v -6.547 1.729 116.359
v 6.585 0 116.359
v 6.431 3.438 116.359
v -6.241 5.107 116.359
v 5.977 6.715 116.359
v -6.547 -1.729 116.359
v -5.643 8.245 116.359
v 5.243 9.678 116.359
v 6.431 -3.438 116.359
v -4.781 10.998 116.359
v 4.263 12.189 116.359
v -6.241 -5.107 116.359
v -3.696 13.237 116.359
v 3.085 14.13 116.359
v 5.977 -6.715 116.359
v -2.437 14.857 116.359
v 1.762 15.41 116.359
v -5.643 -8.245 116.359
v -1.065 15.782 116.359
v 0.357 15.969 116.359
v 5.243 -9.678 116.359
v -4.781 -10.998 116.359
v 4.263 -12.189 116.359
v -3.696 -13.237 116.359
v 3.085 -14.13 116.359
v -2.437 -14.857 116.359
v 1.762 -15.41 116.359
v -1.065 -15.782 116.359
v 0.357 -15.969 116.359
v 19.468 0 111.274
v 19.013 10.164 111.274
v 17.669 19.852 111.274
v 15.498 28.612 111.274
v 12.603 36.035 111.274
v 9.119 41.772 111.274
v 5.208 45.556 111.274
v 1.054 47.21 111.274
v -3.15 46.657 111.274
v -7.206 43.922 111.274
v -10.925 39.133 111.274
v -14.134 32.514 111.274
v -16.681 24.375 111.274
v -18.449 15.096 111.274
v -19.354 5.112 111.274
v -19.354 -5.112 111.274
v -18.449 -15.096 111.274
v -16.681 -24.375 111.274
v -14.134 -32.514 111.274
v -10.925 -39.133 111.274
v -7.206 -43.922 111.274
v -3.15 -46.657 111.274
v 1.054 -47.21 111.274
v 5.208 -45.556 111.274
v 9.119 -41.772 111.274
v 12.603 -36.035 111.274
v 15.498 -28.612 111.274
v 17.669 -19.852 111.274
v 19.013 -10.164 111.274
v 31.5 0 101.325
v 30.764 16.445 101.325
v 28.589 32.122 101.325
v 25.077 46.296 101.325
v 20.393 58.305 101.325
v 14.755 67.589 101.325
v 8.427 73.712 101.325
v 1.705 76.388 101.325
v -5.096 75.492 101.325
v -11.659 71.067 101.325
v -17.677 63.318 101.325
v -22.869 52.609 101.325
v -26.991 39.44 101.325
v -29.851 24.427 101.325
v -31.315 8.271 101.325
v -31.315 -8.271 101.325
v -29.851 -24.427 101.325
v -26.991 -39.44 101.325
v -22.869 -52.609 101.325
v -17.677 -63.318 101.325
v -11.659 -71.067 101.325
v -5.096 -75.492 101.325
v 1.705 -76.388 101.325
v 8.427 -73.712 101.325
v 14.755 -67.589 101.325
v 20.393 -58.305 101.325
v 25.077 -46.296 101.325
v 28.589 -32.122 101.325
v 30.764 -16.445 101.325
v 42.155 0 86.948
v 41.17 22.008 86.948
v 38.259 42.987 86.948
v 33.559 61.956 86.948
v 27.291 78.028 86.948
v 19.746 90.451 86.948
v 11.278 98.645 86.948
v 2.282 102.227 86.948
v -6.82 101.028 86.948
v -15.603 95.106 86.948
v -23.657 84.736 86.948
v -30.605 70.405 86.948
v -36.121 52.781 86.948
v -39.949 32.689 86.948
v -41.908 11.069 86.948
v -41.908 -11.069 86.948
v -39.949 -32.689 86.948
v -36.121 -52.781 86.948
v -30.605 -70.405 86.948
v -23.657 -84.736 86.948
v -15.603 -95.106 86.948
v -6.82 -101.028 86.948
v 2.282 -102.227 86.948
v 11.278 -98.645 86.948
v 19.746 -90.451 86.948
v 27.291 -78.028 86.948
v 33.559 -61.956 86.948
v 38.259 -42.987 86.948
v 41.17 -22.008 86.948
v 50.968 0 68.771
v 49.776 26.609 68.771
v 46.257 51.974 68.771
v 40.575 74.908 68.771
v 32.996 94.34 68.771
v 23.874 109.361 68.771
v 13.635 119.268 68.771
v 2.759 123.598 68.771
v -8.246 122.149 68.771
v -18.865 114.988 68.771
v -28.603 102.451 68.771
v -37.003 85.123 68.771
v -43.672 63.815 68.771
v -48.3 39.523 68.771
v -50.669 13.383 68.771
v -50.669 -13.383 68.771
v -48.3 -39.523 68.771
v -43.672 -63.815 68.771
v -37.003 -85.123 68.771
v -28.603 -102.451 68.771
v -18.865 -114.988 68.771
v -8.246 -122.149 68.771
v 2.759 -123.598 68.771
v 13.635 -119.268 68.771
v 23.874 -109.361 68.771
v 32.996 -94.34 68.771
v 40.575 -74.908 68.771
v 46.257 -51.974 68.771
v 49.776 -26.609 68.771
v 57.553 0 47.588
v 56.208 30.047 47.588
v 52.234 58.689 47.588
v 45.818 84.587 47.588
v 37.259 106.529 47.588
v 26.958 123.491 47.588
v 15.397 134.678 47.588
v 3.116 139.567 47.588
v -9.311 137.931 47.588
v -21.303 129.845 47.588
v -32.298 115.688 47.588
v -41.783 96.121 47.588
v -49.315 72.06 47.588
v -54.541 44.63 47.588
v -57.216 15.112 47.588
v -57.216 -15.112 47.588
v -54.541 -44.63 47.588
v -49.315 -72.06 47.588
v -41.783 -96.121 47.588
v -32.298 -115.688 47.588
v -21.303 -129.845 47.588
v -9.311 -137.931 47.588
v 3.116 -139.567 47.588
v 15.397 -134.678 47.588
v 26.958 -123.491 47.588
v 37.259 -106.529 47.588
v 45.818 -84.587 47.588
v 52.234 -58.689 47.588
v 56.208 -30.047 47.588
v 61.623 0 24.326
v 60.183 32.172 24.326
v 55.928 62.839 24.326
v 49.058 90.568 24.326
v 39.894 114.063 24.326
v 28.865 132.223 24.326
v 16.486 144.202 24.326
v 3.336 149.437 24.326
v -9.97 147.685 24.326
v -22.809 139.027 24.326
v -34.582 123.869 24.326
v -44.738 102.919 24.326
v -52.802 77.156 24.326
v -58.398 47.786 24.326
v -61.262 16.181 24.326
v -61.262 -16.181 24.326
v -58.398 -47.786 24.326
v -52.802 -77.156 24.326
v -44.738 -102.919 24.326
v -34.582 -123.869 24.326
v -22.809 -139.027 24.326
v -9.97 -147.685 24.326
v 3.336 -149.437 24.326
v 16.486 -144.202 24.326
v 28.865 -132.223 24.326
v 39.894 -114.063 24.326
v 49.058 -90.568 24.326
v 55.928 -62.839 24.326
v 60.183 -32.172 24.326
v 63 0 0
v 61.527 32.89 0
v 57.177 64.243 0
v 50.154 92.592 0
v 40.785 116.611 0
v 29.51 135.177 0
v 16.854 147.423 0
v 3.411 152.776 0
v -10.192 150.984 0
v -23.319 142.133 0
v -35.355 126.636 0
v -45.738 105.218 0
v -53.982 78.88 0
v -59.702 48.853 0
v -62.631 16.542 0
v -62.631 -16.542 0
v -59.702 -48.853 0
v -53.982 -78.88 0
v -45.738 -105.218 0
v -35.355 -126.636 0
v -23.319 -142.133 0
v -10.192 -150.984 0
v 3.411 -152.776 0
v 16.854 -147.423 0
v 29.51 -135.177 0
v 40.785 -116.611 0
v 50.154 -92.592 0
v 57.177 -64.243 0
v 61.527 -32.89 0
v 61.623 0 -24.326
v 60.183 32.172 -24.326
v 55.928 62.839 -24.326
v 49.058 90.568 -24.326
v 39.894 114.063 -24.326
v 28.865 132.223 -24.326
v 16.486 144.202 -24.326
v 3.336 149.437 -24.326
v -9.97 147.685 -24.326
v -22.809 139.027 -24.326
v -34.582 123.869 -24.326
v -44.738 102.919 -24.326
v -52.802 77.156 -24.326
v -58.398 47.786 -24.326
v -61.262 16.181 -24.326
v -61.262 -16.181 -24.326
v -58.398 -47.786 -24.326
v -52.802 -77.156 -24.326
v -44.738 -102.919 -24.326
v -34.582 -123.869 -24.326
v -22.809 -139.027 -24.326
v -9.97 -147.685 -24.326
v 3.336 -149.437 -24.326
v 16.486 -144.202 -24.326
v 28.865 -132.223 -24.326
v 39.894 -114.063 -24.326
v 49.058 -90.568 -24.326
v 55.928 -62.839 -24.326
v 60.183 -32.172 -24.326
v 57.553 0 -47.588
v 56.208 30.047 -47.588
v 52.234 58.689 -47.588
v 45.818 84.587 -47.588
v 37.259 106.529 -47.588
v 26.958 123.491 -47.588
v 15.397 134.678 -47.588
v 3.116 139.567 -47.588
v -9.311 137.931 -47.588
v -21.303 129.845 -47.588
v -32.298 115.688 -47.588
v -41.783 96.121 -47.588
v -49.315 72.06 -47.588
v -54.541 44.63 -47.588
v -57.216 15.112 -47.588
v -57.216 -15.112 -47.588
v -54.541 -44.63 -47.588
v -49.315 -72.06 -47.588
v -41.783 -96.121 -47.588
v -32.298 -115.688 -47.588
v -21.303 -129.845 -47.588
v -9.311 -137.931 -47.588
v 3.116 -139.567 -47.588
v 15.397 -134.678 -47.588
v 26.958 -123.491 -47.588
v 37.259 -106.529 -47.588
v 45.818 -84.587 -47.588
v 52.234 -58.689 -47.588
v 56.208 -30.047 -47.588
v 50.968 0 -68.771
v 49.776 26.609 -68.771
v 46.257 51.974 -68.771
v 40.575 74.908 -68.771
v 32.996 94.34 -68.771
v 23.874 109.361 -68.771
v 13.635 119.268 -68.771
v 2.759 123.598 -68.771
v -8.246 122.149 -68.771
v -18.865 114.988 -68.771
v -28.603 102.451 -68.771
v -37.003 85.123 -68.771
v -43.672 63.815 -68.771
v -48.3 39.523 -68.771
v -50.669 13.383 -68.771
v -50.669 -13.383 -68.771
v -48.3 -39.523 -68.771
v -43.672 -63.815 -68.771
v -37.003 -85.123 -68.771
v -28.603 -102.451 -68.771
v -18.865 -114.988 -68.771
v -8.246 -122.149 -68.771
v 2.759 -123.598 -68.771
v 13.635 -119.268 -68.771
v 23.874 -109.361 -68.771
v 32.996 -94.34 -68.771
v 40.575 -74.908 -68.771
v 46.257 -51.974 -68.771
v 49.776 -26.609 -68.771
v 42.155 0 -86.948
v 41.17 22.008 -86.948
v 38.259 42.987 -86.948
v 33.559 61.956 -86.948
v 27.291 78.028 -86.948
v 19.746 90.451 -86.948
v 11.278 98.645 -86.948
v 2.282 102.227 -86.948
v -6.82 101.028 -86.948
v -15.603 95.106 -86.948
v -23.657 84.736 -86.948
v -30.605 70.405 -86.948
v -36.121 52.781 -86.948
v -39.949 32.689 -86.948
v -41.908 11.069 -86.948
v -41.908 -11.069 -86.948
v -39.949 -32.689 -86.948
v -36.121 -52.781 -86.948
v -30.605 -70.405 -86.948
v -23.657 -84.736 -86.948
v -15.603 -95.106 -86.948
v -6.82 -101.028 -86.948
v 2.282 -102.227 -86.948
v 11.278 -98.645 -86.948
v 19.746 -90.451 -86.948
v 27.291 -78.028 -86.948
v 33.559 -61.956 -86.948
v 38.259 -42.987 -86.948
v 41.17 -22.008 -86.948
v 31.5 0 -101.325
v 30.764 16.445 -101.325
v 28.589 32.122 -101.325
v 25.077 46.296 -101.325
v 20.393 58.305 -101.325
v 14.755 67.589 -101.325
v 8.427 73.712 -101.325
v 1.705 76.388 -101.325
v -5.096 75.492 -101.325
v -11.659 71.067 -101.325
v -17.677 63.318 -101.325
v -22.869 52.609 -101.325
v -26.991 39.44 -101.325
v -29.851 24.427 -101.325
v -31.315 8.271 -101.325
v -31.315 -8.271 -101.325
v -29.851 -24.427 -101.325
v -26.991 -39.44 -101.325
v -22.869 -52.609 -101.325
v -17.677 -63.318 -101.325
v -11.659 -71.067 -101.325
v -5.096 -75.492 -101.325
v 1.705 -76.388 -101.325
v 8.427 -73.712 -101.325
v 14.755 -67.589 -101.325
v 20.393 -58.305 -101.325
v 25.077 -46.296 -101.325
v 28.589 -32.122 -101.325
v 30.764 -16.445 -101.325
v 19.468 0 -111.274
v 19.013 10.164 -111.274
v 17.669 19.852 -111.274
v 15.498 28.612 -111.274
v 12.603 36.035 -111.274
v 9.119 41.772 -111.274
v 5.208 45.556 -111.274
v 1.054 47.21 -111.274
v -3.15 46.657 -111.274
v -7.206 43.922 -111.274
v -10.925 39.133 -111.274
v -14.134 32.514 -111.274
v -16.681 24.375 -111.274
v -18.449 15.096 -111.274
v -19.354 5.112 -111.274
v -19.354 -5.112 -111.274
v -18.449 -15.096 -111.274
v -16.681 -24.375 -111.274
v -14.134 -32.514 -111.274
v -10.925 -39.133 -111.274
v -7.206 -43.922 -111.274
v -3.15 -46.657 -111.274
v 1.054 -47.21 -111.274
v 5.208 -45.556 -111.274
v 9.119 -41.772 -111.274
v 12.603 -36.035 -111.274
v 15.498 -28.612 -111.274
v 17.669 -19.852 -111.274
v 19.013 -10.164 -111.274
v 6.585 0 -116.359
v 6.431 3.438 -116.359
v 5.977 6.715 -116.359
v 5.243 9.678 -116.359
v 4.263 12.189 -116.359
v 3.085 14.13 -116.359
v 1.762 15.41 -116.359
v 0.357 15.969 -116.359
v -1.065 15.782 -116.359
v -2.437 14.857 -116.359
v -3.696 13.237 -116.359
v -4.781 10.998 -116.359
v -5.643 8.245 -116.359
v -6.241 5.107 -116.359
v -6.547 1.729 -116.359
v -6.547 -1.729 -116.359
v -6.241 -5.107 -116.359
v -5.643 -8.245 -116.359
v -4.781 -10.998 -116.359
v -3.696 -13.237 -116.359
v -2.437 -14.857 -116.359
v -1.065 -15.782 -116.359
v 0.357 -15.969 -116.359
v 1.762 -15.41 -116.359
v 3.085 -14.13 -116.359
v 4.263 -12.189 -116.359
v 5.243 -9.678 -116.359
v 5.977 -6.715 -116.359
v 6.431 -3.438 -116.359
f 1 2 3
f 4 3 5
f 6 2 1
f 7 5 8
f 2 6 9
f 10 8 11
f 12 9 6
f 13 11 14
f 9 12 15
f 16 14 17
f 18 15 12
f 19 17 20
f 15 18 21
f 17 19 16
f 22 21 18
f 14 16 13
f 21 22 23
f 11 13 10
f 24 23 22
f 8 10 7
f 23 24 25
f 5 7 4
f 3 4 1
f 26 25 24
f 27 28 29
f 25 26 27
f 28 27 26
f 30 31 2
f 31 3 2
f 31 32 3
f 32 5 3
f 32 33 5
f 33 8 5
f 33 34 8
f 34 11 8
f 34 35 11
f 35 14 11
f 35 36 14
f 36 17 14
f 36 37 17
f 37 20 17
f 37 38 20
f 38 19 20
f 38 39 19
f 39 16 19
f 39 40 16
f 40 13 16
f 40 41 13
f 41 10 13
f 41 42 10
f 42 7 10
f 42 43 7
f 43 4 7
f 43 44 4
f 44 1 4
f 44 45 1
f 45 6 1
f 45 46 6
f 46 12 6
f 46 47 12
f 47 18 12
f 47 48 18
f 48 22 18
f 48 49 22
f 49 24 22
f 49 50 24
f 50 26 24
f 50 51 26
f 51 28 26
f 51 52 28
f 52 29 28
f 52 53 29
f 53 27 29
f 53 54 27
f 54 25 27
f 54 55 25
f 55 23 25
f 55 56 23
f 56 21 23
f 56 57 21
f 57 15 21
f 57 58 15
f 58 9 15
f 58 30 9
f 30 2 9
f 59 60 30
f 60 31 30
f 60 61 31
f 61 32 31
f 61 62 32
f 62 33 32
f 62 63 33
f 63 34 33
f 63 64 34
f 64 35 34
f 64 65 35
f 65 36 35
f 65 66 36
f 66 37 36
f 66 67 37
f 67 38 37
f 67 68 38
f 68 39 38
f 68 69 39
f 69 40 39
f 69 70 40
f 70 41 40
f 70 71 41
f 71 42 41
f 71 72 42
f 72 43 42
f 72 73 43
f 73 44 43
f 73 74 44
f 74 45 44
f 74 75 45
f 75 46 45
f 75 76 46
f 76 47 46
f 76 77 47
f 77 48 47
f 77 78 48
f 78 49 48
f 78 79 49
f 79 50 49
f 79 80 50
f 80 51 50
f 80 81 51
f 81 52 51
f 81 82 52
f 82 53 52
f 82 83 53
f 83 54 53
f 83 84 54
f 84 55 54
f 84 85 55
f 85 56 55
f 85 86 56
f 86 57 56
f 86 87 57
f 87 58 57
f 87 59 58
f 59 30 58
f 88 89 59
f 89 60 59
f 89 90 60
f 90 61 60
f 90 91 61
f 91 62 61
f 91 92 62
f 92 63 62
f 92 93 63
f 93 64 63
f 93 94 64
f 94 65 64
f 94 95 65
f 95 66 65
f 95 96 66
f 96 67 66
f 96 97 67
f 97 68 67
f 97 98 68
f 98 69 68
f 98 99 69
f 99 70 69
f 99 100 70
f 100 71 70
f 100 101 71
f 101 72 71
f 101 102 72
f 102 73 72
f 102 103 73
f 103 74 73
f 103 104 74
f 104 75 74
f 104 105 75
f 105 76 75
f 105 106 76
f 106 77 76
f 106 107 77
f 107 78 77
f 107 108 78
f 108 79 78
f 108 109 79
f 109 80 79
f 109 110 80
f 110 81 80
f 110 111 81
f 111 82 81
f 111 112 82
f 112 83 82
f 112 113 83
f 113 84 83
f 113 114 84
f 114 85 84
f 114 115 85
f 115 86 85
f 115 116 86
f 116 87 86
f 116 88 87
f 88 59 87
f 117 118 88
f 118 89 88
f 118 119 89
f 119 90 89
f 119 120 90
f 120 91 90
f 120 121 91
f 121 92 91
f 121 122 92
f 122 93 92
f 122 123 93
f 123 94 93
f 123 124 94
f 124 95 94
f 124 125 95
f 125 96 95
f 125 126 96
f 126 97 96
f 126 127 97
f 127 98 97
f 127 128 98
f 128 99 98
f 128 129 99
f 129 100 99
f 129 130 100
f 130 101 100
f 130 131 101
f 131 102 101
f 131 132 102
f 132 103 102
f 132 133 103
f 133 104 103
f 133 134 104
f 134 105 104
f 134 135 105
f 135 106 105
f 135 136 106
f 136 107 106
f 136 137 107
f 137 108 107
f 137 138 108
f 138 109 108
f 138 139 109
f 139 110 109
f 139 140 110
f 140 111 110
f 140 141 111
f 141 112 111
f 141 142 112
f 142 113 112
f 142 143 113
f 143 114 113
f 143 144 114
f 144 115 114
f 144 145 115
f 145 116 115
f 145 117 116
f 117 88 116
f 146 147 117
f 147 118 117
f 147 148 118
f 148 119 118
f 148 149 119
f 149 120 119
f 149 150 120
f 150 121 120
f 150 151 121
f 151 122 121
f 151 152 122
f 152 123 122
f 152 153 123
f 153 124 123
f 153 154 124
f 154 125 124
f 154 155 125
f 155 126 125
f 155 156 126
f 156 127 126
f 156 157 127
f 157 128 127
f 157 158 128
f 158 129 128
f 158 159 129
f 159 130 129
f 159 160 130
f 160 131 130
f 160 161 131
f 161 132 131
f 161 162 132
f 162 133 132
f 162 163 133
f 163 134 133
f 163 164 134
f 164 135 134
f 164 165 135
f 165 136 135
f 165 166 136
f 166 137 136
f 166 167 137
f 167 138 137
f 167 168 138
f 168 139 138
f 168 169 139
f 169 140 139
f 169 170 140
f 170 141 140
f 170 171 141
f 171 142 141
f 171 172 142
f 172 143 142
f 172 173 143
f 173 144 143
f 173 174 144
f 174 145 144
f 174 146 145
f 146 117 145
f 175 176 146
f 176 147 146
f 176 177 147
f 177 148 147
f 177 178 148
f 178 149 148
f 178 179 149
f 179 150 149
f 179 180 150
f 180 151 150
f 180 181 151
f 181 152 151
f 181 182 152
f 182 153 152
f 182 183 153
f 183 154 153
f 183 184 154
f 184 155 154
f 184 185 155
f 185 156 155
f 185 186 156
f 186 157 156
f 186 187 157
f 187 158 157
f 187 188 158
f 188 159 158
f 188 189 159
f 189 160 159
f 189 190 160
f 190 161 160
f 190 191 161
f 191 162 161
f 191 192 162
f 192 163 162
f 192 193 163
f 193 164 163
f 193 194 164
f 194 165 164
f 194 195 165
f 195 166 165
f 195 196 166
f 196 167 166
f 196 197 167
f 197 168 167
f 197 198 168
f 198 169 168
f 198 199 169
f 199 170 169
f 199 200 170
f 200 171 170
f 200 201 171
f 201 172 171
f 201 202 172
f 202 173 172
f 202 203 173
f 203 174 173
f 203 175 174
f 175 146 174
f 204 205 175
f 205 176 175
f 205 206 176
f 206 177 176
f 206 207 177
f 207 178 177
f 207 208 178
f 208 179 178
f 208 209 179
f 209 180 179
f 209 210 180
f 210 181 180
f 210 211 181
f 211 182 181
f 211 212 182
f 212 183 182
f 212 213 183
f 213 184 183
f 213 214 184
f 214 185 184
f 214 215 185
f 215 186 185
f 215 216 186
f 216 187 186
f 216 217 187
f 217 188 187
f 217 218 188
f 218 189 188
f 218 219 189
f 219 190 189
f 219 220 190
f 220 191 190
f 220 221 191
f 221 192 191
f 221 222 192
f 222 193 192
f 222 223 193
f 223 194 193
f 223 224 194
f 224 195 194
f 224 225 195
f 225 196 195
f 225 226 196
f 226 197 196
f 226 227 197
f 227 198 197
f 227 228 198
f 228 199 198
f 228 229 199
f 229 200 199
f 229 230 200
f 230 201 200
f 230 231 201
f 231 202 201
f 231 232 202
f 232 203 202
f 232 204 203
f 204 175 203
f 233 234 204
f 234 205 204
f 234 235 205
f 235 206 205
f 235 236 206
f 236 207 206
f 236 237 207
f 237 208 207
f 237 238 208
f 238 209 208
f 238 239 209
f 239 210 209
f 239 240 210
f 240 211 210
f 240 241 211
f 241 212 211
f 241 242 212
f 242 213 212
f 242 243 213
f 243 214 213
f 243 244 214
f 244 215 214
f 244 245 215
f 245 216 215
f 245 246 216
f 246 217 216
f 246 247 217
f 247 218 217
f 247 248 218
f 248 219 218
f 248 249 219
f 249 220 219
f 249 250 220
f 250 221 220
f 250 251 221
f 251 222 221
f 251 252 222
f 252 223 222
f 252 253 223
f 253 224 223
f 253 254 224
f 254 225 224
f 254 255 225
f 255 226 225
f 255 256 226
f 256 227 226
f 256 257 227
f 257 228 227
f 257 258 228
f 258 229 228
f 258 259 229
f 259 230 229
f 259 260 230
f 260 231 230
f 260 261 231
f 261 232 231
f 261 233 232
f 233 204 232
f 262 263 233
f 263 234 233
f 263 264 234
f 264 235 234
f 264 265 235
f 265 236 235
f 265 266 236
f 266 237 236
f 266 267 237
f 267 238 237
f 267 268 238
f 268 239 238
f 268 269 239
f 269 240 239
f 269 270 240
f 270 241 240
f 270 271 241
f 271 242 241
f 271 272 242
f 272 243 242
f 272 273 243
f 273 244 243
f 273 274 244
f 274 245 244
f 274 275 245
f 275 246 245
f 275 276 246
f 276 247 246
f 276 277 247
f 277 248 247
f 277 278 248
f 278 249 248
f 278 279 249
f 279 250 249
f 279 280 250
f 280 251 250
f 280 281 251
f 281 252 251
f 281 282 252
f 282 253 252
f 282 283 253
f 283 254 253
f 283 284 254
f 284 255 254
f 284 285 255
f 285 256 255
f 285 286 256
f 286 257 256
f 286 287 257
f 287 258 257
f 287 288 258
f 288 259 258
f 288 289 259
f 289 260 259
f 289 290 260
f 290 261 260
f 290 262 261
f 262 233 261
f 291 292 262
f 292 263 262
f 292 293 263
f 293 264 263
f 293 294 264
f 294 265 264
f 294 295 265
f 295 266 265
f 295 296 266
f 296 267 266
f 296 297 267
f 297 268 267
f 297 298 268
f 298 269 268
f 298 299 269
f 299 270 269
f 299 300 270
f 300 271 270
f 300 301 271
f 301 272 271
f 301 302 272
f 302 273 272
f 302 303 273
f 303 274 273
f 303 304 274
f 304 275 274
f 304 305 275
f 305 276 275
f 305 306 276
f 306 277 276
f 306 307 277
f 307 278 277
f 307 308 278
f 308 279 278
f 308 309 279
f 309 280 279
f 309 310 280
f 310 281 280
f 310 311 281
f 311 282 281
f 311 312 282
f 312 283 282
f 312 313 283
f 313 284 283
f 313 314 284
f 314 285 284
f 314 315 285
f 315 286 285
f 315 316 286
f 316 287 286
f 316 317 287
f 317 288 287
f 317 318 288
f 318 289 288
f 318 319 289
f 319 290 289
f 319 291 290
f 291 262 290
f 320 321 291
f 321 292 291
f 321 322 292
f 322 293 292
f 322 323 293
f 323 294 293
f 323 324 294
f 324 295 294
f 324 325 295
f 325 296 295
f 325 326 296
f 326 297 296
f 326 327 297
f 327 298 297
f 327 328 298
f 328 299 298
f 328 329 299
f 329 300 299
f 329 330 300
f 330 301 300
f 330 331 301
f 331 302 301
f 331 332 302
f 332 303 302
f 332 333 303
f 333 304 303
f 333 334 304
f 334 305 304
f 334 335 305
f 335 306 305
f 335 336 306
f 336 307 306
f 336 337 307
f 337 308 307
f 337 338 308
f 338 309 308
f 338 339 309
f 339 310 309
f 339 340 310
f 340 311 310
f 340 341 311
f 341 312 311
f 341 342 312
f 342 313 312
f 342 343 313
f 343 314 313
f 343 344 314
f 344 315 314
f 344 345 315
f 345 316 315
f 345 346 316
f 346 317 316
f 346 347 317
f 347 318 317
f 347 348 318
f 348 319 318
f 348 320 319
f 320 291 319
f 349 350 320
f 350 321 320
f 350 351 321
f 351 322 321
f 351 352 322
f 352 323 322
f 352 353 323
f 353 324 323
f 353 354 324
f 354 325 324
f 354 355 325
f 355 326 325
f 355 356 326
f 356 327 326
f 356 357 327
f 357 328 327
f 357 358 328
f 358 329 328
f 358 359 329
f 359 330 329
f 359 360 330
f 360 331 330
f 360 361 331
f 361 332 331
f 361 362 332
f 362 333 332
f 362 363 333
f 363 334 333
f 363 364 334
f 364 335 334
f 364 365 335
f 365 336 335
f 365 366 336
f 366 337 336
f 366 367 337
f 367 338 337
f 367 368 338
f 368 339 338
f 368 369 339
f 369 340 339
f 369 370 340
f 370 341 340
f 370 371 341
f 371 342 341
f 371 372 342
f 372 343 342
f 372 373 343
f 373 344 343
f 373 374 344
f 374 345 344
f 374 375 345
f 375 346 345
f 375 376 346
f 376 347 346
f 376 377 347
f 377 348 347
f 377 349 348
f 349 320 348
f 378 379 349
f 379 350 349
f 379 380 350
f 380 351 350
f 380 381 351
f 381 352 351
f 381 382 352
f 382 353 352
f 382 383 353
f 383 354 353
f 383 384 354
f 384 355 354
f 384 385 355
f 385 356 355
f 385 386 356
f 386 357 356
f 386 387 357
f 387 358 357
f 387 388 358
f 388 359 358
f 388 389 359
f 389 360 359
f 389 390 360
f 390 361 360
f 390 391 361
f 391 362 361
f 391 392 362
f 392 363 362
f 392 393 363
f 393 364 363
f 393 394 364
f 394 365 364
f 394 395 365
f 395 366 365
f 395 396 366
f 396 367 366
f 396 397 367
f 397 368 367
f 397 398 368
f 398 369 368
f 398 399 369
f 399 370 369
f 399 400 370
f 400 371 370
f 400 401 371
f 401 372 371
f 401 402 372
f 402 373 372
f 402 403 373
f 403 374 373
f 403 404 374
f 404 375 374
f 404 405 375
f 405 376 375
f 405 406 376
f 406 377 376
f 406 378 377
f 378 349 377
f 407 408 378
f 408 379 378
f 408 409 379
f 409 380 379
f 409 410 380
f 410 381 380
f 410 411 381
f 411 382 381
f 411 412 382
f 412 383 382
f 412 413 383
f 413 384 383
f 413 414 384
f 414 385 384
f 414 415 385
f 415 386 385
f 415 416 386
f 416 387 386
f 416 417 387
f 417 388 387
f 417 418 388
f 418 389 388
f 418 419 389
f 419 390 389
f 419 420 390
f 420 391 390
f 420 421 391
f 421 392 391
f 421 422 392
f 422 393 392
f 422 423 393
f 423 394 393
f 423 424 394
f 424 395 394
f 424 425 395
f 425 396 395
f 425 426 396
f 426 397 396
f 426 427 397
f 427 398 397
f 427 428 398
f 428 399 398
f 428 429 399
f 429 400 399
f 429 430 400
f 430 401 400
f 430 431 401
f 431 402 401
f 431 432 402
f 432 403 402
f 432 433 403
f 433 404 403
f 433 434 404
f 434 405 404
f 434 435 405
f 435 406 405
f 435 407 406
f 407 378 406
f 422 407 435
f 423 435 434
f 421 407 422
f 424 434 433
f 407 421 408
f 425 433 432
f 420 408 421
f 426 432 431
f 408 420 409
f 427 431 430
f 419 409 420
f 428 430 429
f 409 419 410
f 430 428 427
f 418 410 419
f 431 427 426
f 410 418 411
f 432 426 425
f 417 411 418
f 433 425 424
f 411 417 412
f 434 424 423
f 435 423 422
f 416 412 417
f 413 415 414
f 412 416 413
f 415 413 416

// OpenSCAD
// Generated by SolidPython 1.0.1 on 2020-07-29 00:46:48


scale(v = [7, 17, 13]) {
	sphere(r = 9);
}
/***********************************************
*********      SolidPython code:      **********
************************************************
 
# import packages: SolidPython
from solid import *
from solid.utils import *
from itertools import chain, combinations, permutations


class Resize:

    def __init__(self, scad_file):
        self.scad_file = scad_file
        #self.scad_file = import_scad(scad_file)
        # cone/cylinder param:
        self.r1 = 0
        self.r2 = 0
        self.h = 0
        # rectangular prism param:
        self.w = 0
        self.l = 0
        # ellipse param:
        self.r = 0

    # import OpenScad code (file name corresponds to shape)


    # classify shape + parameters
    def assign(self, param1, param2, param3):
        if self.scad_file == 'cone.scad':
            self.r1 = param1
            self.r2 = param2
            self.h = param3
        elif self.scad_file == 'cylinder.scad':
            self.r1 = param1
            self.r2 = param2
            self.h = param3
        elif self.scad_file == 'rectangularPrism.scad':
            self.h = param1
            self.l = param2
            self.w = param3
        else:
            self.r = param1
            self.h = param2

    # resize parameters
    def iterate(self):
        x = range(3, 20, 2)
        i = 1
        if self.scad_file == 'cone.scad':
            tempList = list(permutations(x, 2))
            for temp in tempList:
                param1 = temp[0]
                param2 = temp[1]
                filepath = 'produced_scad_files/' + 'cone' + str(param1) + '_' + str(param2) + '_' + '.scad'
                scad_render_to_file(cylinder(h=param1, r1=param2, r2=0), filepath)

        elif self.scad_file == 'cylinder.scad':
            tempList = list(permutations(x, 3))
            for temp in tempList:
                param1 = temp[0]
                param2 = temp[1]
                filepath = 'produced_scad_files/' + 'cylinder' + str(param1) + '_' + str(param2) + '_' + '.scad'
                scad_render_to_file(cylinder(h=param1, r1=param2, r2=param2), filepath)

        elif self.scad_file == 'rectangularPrism.scad':
            tempList = list(permutations(x, 3))
            for temp in tempList:
                param1 = temp[0]
                param2 = temp[1]
                param3 = temp[2]
                filepath = 'produced_scad_files/' + 'rectangularPrism' + str(param1) + '_' + str(param2) + '_' + str(
                    param3) + '.scad'
                scad_render_to_file(cube(size=(param1, param2, param3)), filepath)

        elif self.scad_file == 'ellipse.scad':
            tempList = list(permutations(x, 4))
            for temp in tempList:
                param1 = temp[0]
                param2 = temp[1]
                param3 = temp[2]
                param4 = temp[3]
                filepath = 'produced_scad_files/' + 'ellipse' + str(param1) + '_' + str(param2) + '_' + str(param3) + '_' + str(param4) + '.scad'
                scad_render_to_file(scale([param1, param2, param3])(sphere(r=param4)), filepath)

    def render_to_scadfile(self):
        scad_render_to_file(scad, 'example.scad') 
 
************************************************/
